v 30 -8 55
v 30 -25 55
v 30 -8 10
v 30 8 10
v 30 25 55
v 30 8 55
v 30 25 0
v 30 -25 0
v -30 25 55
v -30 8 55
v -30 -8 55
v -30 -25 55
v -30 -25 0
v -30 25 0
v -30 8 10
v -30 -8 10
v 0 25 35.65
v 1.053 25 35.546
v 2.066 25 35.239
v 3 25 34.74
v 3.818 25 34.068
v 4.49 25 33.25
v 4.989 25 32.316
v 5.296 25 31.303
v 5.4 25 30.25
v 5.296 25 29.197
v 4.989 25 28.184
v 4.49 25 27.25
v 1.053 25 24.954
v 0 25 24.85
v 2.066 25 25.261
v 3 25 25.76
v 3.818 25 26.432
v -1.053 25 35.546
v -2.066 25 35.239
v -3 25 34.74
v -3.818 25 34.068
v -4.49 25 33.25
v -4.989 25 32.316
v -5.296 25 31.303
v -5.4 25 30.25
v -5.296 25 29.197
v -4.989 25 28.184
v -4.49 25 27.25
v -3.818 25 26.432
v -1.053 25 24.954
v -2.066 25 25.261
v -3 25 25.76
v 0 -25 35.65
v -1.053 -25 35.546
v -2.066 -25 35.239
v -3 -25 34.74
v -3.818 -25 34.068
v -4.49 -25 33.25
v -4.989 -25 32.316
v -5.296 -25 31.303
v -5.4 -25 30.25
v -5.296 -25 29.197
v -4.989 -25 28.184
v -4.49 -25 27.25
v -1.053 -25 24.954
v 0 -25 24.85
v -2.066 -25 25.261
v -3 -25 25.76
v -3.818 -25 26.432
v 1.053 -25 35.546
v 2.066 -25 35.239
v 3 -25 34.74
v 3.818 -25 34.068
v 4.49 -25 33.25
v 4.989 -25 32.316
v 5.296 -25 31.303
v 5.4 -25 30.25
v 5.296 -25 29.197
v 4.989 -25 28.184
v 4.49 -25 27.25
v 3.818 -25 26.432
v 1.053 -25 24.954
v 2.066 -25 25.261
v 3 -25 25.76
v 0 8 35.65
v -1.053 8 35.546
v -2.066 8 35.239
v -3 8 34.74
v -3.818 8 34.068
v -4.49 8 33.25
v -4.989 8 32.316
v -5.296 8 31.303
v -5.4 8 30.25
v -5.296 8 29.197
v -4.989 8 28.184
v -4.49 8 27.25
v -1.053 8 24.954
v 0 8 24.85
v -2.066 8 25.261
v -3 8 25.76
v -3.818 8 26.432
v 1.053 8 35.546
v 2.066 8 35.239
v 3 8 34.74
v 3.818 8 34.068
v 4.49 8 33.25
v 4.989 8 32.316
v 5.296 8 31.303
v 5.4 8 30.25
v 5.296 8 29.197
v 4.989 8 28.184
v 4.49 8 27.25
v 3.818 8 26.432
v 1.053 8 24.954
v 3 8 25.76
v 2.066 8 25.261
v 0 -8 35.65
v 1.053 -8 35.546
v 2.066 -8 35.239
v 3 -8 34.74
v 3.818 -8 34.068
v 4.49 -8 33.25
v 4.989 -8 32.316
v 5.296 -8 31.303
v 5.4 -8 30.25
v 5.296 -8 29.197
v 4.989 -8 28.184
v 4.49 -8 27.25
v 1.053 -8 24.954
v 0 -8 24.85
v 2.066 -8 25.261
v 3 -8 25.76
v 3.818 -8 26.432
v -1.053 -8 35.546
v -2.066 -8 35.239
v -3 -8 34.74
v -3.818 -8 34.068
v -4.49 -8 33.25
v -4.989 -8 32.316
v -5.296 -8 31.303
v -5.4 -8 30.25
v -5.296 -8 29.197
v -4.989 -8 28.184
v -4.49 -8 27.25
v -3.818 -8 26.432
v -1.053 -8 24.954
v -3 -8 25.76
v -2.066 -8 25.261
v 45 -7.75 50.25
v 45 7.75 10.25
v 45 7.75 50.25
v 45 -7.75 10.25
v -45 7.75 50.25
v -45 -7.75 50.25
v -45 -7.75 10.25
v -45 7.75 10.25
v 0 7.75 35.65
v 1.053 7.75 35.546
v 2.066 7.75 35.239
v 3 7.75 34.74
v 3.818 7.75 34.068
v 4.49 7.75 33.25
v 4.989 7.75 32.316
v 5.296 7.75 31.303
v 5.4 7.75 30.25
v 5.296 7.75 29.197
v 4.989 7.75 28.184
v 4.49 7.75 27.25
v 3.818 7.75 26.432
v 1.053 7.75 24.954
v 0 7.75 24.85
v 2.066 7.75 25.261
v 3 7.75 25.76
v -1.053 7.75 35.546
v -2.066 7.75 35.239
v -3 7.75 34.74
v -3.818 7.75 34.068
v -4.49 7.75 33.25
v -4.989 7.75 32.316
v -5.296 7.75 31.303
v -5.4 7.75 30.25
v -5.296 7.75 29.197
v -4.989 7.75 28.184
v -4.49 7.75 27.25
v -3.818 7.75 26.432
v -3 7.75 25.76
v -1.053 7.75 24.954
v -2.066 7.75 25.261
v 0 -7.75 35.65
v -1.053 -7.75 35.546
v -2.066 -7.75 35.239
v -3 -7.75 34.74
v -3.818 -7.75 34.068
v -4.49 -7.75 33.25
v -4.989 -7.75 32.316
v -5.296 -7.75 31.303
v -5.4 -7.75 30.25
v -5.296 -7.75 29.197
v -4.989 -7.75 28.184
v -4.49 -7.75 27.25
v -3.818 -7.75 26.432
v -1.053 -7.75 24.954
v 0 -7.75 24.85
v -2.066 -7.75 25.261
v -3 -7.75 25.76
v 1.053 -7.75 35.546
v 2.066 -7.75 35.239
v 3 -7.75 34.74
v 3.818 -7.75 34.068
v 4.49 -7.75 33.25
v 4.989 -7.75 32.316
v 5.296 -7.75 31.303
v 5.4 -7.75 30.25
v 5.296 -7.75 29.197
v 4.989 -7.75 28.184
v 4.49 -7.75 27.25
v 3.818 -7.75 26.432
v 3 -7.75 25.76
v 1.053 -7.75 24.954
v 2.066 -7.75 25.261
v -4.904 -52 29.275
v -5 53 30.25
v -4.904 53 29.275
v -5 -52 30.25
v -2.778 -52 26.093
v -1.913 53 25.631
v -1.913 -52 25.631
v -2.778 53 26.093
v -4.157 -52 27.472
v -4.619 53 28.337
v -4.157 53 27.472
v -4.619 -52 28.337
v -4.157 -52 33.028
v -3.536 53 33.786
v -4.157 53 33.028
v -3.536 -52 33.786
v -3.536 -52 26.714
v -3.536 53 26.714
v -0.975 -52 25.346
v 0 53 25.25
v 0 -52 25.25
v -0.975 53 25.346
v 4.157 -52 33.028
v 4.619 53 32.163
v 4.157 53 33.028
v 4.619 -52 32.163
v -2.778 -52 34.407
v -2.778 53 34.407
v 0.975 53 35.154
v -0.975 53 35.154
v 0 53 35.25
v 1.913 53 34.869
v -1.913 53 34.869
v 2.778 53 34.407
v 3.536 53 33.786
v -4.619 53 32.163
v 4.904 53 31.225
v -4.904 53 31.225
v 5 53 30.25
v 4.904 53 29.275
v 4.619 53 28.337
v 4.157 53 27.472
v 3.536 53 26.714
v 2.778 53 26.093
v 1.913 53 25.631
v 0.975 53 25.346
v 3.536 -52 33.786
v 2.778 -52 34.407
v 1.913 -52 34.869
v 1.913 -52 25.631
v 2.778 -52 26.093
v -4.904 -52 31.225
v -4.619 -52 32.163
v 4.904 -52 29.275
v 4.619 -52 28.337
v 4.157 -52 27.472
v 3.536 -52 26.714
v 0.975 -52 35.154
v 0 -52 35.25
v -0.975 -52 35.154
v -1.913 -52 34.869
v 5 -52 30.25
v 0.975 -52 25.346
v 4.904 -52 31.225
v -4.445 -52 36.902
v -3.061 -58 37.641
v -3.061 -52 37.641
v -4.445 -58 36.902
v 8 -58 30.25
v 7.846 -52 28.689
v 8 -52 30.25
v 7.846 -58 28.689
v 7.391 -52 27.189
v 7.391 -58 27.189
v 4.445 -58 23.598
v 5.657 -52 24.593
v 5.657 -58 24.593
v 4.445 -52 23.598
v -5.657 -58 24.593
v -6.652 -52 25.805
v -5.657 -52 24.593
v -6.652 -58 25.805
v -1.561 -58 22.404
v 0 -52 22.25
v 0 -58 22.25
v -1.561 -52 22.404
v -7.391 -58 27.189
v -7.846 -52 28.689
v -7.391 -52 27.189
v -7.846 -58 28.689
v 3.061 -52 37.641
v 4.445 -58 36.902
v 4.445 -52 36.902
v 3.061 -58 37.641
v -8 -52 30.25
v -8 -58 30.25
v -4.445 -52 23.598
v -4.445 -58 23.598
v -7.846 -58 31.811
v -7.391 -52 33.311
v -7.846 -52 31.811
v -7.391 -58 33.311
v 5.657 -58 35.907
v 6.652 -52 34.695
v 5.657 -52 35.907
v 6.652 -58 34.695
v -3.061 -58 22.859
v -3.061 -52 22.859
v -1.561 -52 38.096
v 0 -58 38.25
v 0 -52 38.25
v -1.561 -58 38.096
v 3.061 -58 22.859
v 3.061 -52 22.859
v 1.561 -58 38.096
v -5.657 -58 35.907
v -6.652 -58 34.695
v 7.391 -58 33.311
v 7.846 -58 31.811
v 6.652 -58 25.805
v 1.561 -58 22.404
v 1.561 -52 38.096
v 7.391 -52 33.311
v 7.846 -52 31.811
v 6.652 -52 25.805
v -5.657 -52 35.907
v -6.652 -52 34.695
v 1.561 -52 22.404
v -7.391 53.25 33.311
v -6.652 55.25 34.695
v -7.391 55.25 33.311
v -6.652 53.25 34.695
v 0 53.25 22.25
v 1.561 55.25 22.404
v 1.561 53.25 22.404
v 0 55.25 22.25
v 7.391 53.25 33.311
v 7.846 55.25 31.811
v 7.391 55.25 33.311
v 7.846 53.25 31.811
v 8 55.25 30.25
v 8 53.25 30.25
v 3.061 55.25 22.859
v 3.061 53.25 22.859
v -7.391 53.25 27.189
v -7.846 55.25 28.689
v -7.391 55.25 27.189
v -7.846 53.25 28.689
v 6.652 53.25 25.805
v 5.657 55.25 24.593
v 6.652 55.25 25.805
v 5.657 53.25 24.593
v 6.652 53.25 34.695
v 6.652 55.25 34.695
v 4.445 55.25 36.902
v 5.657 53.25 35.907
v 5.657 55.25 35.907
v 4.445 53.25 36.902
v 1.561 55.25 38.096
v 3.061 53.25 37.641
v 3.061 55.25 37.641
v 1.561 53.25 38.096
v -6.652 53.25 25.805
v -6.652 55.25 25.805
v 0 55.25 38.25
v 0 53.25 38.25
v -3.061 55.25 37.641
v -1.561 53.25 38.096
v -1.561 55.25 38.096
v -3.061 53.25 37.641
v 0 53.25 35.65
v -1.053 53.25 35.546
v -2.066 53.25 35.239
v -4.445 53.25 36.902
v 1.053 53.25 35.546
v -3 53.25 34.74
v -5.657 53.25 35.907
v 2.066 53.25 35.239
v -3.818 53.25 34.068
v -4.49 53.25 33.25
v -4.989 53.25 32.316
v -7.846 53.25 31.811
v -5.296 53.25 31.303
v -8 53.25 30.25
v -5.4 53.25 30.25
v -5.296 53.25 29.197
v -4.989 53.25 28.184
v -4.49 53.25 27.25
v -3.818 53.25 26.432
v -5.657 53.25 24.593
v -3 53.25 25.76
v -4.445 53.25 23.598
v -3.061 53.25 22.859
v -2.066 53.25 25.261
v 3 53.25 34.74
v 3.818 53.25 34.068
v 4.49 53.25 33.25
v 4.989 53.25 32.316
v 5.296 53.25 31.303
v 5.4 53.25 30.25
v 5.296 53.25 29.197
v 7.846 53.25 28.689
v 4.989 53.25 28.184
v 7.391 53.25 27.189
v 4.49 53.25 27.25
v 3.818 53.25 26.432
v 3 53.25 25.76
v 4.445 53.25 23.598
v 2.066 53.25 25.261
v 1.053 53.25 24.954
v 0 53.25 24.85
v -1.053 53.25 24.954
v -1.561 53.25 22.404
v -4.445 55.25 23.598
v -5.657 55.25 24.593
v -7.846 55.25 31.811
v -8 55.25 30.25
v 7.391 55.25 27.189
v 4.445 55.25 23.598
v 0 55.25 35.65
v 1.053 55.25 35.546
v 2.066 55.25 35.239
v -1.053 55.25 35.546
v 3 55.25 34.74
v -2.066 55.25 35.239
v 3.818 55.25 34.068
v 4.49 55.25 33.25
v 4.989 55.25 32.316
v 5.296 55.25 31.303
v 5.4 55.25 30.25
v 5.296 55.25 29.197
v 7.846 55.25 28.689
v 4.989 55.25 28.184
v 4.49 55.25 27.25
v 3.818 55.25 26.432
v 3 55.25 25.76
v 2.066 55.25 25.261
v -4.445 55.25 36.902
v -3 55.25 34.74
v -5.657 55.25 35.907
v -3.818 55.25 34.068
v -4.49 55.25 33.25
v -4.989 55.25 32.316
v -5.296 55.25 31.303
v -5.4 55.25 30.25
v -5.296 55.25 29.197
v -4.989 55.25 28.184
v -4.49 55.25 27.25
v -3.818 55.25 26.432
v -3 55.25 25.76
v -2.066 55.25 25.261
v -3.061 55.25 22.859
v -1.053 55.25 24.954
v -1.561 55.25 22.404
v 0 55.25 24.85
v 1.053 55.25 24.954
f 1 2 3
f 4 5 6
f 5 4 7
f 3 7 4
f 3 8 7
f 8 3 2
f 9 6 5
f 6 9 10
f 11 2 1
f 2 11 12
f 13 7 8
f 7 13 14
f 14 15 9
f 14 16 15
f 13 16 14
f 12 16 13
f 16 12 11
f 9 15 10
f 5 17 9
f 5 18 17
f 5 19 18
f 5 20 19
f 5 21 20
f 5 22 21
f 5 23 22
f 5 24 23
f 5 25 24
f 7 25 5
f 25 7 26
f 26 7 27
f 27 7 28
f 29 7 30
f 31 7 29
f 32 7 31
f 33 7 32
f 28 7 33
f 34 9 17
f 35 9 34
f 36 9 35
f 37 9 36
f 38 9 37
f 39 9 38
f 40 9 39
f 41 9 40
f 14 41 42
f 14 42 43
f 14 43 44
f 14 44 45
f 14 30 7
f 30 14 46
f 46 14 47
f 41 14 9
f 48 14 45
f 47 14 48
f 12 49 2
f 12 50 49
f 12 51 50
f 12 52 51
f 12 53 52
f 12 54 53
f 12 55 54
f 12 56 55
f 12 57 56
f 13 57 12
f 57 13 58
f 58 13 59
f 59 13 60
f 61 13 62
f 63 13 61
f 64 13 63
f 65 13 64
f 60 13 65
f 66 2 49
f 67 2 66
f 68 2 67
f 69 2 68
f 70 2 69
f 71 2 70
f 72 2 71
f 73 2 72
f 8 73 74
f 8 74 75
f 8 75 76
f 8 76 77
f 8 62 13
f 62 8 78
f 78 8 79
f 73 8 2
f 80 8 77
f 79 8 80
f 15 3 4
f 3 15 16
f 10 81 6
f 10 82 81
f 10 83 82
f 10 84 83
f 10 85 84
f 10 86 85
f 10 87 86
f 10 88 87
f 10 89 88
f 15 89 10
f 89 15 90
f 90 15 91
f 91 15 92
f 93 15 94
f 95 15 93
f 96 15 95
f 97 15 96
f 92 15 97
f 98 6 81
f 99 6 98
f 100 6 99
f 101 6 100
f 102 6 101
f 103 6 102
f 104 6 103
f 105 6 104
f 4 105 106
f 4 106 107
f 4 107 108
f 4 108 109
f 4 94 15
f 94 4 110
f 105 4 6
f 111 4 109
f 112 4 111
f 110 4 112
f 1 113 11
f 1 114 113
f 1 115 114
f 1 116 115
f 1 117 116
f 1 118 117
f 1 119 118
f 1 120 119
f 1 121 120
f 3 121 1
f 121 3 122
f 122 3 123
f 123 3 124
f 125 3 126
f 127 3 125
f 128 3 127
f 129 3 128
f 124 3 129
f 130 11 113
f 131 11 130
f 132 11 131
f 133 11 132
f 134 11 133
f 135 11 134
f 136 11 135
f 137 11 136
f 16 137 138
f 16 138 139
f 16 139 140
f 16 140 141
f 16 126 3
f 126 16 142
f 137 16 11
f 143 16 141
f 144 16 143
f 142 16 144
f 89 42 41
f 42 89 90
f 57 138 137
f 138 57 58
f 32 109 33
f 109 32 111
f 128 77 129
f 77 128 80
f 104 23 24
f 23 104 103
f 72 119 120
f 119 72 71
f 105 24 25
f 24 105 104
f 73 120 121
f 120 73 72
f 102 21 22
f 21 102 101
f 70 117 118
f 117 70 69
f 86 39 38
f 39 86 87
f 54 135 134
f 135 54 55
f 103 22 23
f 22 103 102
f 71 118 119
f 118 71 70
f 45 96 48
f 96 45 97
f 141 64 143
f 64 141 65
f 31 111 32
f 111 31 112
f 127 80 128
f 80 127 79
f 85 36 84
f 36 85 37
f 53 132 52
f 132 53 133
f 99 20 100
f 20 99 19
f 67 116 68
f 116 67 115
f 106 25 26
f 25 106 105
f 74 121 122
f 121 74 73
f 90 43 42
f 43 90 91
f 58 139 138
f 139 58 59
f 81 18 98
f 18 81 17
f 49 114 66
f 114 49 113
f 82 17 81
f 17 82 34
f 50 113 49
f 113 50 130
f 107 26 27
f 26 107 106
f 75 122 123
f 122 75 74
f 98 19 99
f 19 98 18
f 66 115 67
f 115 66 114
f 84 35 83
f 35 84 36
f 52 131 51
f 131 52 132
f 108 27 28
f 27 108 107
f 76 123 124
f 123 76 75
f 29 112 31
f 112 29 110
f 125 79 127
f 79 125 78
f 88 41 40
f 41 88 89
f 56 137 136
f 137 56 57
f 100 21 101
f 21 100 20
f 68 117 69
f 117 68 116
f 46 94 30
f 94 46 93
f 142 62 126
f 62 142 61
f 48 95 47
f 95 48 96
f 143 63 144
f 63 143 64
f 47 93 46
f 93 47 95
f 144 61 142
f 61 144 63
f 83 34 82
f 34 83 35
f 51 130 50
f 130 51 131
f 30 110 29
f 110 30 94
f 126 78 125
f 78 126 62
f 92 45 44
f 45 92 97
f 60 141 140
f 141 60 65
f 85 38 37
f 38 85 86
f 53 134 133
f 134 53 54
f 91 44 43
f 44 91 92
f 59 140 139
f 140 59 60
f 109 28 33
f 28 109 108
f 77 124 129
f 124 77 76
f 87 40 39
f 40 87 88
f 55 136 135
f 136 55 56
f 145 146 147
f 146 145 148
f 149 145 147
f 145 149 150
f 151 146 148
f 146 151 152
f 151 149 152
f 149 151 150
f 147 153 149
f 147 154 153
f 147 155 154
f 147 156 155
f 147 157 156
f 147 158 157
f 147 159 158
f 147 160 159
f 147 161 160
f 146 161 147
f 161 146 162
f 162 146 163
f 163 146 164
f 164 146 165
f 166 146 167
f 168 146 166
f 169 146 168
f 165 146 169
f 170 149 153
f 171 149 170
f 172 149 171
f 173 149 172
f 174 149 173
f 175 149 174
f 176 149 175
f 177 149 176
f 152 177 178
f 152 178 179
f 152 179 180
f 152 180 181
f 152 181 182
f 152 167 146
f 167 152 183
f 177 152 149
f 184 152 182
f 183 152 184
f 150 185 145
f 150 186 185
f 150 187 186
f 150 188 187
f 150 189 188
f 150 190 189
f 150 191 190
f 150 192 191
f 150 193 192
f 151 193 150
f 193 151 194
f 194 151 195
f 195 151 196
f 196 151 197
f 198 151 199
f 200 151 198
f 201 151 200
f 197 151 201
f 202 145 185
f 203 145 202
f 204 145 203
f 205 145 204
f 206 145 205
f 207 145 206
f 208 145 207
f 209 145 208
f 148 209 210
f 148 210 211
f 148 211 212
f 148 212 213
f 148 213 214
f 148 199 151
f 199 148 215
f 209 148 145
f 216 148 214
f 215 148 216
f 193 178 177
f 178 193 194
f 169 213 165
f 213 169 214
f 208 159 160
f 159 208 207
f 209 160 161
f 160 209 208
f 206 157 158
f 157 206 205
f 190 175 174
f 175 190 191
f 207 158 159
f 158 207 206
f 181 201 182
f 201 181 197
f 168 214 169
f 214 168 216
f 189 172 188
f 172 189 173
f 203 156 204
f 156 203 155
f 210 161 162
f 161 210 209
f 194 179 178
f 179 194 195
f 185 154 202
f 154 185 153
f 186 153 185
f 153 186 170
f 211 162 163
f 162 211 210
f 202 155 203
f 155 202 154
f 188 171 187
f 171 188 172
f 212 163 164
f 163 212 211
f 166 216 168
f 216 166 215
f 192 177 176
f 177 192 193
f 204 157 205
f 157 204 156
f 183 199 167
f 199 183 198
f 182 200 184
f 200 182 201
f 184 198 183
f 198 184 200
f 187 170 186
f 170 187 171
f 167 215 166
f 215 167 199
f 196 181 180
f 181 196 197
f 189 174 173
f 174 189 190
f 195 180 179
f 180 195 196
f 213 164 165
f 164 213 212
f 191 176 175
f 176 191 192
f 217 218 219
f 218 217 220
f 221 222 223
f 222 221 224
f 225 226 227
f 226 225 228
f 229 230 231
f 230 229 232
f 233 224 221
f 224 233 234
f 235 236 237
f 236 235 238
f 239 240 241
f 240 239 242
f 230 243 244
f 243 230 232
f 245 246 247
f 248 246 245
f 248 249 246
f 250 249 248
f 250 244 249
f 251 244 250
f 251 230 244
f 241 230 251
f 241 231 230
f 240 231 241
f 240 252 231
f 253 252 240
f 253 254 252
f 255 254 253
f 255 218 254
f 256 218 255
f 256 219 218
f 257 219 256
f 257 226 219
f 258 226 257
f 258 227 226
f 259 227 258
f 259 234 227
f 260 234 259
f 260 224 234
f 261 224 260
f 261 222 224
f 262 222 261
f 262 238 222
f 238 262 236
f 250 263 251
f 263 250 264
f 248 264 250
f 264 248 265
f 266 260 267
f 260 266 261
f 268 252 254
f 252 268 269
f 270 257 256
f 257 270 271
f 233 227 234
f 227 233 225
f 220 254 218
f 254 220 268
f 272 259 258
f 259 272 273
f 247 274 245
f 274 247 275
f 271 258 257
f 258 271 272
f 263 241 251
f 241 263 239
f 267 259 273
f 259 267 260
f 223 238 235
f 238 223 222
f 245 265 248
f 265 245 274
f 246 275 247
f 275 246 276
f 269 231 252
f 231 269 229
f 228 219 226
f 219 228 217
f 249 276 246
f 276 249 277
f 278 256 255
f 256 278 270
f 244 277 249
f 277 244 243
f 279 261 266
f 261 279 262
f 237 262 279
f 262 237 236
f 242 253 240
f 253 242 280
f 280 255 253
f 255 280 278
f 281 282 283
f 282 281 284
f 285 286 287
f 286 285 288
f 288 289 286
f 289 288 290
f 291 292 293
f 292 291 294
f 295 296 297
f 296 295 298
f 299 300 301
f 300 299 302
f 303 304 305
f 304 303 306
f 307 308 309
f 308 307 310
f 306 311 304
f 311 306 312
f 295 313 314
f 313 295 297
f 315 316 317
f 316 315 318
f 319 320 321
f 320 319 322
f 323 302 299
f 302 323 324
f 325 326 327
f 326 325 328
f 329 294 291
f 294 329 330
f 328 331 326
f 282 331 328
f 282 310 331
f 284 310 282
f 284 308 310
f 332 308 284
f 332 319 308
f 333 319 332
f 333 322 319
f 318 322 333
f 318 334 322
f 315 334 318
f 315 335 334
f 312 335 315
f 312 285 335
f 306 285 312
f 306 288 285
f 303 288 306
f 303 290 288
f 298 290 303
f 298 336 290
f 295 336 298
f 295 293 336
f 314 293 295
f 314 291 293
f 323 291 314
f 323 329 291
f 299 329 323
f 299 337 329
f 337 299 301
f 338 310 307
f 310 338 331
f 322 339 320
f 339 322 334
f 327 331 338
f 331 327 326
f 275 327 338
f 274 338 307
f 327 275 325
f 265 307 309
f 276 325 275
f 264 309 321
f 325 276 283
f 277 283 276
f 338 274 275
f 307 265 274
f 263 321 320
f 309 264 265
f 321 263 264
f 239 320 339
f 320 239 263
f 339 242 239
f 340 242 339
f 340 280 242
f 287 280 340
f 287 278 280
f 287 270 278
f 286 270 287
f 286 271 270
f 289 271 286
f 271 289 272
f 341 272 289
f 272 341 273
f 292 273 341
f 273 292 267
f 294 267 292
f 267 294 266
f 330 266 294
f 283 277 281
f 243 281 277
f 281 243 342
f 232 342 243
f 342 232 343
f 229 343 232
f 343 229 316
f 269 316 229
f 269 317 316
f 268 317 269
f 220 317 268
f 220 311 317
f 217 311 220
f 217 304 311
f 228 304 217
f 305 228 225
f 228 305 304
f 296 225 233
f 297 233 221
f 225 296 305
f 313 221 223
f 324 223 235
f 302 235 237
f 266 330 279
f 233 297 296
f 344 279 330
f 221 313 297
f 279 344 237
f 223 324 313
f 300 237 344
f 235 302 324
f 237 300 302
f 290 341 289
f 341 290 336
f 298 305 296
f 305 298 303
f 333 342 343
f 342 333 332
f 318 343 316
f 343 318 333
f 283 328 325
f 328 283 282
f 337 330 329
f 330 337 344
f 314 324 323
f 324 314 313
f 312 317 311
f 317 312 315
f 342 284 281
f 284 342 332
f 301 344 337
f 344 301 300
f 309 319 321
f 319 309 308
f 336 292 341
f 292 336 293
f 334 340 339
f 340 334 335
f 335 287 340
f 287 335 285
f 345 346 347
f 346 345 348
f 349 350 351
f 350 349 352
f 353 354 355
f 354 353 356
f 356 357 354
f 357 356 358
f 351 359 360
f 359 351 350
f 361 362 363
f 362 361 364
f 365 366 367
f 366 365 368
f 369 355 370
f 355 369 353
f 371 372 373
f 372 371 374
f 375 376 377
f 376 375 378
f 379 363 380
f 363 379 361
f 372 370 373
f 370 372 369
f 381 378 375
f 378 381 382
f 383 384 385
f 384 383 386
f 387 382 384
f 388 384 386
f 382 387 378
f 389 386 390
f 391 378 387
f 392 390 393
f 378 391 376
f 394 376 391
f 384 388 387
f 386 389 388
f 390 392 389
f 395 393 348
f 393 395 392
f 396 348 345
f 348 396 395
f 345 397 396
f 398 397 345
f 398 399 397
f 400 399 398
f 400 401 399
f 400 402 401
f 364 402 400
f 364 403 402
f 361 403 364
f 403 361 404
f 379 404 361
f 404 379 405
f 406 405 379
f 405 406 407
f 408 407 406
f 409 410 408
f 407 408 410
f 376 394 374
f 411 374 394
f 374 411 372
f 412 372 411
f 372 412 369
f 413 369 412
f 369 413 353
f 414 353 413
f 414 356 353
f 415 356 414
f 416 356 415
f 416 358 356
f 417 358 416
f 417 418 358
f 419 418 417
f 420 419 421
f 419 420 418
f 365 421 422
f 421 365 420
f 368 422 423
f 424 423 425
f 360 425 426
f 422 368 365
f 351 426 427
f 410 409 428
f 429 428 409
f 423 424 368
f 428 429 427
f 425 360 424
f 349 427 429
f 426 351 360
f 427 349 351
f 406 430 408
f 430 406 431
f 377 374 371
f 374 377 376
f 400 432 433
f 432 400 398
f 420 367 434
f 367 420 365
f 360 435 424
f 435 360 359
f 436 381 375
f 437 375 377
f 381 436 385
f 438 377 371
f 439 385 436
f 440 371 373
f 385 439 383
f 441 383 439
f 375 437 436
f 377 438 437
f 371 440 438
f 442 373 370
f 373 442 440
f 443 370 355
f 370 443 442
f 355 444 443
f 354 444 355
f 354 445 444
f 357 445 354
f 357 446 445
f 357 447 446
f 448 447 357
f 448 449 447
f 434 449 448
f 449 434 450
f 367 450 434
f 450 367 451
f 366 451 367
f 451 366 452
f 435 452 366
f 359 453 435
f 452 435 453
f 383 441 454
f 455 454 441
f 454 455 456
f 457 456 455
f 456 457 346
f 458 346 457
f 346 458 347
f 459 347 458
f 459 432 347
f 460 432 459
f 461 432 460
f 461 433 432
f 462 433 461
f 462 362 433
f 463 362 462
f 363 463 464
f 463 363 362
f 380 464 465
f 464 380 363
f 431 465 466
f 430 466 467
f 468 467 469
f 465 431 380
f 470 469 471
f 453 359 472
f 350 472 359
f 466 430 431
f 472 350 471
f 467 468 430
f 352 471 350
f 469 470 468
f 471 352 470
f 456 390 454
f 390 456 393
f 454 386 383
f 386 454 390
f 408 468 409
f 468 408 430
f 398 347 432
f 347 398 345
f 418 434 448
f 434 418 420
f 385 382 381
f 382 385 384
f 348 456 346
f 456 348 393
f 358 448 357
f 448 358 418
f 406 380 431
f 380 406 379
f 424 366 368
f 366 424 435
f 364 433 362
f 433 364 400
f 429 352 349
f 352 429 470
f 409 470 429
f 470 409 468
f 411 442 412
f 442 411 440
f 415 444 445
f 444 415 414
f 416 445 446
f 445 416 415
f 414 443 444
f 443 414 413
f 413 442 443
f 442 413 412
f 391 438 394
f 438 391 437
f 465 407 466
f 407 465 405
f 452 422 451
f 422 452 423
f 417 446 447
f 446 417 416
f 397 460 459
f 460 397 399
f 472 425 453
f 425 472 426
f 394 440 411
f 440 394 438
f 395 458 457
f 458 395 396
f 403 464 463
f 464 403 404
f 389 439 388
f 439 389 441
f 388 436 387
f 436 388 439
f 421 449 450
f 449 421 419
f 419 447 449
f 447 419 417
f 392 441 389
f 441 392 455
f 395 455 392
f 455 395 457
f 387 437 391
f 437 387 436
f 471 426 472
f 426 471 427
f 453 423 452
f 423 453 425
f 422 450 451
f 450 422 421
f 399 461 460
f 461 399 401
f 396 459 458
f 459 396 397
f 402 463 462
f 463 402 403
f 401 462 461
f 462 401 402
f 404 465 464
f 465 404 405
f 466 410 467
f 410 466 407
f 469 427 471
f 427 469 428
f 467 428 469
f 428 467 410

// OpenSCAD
$fn = 32;

// ------------------------------------------------------------------------
// Clevis joint: 60 mm clevis, pin d10
// Every part is its own module, assembly() places them once.
// ------------------------------------------------------------------------

// --- part 1 ---
module clevis() {
  difference() {
    translate([-30, -25, 0]) cube([60, 50, 55]);
    translate([-31, -8, 10]) cube([62, 16, 46]);
    translate([0, 0, 30.25]) rotate([90, 0, 0]) cylinder(h = 52, d = 10.8, center = true);
  }
}

// --- part 2 ---
module eye() {
  difference() {
    translate([-45, -7.75, 0]) cube([90, 15.5, 40]);
    translate([0, 0, 20]) rotate([90, 0, 0]) cylinder(h = 17.5, d = 10.8, center = true);
  }
}

// --- part 3 ---
module pin() {
  rotate([0, 90, 0]) cylinder(h = 106, d = 10, center = true);
  translate([-58, 0, 0]) rotate([0, 90, 0]) cylinder(h = 6, d = 16);
}

// --- part 4 ---
module retainer() {
  difference() {
      translate([0, 0, 0]) cylinder(h = 2, d = 16);
      translate([0, 0, -1]) cylinder(h = 4, d = 10.8);
    }
}

// --- assembly ---
module assembly() {
  translate([0, 0, 0]) rotate([0, 0, 0]) clevis();
  translate([0, 0, 10.25]) rotate([0, 0, 0]) eye();
  translate([0, 0, 30.25]) rotate([0, 0, 90]) pin();
  translate([0, 55.25, 30.25]) rotate([90, 0, 0]) retainer();
}

assembly();
